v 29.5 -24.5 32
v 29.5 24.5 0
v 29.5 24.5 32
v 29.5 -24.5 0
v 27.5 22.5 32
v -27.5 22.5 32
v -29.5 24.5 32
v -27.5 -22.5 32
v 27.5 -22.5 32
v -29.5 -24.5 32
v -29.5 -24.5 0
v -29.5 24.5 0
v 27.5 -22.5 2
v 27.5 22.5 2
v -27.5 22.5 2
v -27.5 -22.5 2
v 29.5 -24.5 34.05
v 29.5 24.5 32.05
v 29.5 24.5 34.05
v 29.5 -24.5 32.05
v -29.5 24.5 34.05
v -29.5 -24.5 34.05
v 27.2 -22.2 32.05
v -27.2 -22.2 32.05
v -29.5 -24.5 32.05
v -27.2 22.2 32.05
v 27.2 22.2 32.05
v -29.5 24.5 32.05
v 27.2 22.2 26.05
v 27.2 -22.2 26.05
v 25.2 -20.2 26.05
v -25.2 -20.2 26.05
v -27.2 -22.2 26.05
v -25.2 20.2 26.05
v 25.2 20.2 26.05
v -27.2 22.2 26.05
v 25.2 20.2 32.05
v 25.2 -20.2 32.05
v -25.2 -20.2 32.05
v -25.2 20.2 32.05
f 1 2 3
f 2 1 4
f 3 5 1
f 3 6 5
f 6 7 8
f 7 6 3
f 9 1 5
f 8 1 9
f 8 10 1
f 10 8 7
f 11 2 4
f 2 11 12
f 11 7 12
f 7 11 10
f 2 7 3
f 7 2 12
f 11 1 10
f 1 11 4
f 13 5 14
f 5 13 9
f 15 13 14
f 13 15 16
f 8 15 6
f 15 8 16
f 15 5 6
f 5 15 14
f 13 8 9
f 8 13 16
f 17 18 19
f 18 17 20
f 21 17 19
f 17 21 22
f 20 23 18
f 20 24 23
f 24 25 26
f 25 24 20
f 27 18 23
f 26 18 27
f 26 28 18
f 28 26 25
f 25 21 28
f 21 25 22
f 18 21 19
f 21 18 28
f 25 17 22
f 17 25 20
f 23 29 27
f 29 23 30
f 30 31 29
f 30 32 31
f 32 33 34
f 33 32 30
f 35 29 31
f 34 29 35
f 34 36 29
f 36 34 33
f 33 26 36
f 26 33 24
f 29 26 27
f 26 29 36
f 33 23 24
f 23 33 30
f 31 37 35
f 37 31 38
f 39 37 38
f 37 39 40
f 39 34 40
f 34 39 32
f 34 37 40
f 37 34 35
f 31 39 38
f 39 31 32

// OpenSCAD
$fn = 48;

// Two-part slip-fit enclosure, units in mm.
// Minimum assembled clear cavity: 50.4 x 40.4 x (30.0 + assembly_gap)

wall = 2.0;             // nominal wall thickness
clearance = 0.30;       // nominal print clearance per mating side
assembly_gap = 0.05;    // tiny display gap so the two solids remain disjoint
cavity = [55.0, 45.0, 30.0];
lid_insert_depth = 6.0;

base_outer = [
    cavity[0] + 2 * wall,
    cavity[1] + 2 * wall,
    cavity[2] + wall
];

lid_insert_outer = [
    cavity[0] - 2 * clearance,
    cavity[1] - 2 * clearance,
    lid_insert_depth
];

lid_insert_inner = [
    lid_insert_outer[0] - 2 * wall,
    lid_insert_outer[1] - 2 * wall,
    lid_insert_depth
];

module place(size, z0) {
    translate([-size[0] / 2, -size[1] / 2, z0]) cube(size);
}

module base_part() {
    difference() {
        place(base_outer, 0);
        place([cavity[0], cavity[1], cavity[2]], wall);
    }
}

module lid_part() {
    difference() {
        union() {
            // Top plate
            place([base_outer[0], base_outer[1], wall], base_outer[2] + assembly_gap);

            // Internal locating plug
            place(lid_insert_outer, base_outer[2] + assembly_gap - lid_insert_depth);
        }

        // Hollow out the plug so the minimum clear opening stays above 50 x 40 mm
        place(lid_insert_inner, base_outer[2] + assembly_gap - lid_insert_depth);
    }
}

base_part();
lid_part();
